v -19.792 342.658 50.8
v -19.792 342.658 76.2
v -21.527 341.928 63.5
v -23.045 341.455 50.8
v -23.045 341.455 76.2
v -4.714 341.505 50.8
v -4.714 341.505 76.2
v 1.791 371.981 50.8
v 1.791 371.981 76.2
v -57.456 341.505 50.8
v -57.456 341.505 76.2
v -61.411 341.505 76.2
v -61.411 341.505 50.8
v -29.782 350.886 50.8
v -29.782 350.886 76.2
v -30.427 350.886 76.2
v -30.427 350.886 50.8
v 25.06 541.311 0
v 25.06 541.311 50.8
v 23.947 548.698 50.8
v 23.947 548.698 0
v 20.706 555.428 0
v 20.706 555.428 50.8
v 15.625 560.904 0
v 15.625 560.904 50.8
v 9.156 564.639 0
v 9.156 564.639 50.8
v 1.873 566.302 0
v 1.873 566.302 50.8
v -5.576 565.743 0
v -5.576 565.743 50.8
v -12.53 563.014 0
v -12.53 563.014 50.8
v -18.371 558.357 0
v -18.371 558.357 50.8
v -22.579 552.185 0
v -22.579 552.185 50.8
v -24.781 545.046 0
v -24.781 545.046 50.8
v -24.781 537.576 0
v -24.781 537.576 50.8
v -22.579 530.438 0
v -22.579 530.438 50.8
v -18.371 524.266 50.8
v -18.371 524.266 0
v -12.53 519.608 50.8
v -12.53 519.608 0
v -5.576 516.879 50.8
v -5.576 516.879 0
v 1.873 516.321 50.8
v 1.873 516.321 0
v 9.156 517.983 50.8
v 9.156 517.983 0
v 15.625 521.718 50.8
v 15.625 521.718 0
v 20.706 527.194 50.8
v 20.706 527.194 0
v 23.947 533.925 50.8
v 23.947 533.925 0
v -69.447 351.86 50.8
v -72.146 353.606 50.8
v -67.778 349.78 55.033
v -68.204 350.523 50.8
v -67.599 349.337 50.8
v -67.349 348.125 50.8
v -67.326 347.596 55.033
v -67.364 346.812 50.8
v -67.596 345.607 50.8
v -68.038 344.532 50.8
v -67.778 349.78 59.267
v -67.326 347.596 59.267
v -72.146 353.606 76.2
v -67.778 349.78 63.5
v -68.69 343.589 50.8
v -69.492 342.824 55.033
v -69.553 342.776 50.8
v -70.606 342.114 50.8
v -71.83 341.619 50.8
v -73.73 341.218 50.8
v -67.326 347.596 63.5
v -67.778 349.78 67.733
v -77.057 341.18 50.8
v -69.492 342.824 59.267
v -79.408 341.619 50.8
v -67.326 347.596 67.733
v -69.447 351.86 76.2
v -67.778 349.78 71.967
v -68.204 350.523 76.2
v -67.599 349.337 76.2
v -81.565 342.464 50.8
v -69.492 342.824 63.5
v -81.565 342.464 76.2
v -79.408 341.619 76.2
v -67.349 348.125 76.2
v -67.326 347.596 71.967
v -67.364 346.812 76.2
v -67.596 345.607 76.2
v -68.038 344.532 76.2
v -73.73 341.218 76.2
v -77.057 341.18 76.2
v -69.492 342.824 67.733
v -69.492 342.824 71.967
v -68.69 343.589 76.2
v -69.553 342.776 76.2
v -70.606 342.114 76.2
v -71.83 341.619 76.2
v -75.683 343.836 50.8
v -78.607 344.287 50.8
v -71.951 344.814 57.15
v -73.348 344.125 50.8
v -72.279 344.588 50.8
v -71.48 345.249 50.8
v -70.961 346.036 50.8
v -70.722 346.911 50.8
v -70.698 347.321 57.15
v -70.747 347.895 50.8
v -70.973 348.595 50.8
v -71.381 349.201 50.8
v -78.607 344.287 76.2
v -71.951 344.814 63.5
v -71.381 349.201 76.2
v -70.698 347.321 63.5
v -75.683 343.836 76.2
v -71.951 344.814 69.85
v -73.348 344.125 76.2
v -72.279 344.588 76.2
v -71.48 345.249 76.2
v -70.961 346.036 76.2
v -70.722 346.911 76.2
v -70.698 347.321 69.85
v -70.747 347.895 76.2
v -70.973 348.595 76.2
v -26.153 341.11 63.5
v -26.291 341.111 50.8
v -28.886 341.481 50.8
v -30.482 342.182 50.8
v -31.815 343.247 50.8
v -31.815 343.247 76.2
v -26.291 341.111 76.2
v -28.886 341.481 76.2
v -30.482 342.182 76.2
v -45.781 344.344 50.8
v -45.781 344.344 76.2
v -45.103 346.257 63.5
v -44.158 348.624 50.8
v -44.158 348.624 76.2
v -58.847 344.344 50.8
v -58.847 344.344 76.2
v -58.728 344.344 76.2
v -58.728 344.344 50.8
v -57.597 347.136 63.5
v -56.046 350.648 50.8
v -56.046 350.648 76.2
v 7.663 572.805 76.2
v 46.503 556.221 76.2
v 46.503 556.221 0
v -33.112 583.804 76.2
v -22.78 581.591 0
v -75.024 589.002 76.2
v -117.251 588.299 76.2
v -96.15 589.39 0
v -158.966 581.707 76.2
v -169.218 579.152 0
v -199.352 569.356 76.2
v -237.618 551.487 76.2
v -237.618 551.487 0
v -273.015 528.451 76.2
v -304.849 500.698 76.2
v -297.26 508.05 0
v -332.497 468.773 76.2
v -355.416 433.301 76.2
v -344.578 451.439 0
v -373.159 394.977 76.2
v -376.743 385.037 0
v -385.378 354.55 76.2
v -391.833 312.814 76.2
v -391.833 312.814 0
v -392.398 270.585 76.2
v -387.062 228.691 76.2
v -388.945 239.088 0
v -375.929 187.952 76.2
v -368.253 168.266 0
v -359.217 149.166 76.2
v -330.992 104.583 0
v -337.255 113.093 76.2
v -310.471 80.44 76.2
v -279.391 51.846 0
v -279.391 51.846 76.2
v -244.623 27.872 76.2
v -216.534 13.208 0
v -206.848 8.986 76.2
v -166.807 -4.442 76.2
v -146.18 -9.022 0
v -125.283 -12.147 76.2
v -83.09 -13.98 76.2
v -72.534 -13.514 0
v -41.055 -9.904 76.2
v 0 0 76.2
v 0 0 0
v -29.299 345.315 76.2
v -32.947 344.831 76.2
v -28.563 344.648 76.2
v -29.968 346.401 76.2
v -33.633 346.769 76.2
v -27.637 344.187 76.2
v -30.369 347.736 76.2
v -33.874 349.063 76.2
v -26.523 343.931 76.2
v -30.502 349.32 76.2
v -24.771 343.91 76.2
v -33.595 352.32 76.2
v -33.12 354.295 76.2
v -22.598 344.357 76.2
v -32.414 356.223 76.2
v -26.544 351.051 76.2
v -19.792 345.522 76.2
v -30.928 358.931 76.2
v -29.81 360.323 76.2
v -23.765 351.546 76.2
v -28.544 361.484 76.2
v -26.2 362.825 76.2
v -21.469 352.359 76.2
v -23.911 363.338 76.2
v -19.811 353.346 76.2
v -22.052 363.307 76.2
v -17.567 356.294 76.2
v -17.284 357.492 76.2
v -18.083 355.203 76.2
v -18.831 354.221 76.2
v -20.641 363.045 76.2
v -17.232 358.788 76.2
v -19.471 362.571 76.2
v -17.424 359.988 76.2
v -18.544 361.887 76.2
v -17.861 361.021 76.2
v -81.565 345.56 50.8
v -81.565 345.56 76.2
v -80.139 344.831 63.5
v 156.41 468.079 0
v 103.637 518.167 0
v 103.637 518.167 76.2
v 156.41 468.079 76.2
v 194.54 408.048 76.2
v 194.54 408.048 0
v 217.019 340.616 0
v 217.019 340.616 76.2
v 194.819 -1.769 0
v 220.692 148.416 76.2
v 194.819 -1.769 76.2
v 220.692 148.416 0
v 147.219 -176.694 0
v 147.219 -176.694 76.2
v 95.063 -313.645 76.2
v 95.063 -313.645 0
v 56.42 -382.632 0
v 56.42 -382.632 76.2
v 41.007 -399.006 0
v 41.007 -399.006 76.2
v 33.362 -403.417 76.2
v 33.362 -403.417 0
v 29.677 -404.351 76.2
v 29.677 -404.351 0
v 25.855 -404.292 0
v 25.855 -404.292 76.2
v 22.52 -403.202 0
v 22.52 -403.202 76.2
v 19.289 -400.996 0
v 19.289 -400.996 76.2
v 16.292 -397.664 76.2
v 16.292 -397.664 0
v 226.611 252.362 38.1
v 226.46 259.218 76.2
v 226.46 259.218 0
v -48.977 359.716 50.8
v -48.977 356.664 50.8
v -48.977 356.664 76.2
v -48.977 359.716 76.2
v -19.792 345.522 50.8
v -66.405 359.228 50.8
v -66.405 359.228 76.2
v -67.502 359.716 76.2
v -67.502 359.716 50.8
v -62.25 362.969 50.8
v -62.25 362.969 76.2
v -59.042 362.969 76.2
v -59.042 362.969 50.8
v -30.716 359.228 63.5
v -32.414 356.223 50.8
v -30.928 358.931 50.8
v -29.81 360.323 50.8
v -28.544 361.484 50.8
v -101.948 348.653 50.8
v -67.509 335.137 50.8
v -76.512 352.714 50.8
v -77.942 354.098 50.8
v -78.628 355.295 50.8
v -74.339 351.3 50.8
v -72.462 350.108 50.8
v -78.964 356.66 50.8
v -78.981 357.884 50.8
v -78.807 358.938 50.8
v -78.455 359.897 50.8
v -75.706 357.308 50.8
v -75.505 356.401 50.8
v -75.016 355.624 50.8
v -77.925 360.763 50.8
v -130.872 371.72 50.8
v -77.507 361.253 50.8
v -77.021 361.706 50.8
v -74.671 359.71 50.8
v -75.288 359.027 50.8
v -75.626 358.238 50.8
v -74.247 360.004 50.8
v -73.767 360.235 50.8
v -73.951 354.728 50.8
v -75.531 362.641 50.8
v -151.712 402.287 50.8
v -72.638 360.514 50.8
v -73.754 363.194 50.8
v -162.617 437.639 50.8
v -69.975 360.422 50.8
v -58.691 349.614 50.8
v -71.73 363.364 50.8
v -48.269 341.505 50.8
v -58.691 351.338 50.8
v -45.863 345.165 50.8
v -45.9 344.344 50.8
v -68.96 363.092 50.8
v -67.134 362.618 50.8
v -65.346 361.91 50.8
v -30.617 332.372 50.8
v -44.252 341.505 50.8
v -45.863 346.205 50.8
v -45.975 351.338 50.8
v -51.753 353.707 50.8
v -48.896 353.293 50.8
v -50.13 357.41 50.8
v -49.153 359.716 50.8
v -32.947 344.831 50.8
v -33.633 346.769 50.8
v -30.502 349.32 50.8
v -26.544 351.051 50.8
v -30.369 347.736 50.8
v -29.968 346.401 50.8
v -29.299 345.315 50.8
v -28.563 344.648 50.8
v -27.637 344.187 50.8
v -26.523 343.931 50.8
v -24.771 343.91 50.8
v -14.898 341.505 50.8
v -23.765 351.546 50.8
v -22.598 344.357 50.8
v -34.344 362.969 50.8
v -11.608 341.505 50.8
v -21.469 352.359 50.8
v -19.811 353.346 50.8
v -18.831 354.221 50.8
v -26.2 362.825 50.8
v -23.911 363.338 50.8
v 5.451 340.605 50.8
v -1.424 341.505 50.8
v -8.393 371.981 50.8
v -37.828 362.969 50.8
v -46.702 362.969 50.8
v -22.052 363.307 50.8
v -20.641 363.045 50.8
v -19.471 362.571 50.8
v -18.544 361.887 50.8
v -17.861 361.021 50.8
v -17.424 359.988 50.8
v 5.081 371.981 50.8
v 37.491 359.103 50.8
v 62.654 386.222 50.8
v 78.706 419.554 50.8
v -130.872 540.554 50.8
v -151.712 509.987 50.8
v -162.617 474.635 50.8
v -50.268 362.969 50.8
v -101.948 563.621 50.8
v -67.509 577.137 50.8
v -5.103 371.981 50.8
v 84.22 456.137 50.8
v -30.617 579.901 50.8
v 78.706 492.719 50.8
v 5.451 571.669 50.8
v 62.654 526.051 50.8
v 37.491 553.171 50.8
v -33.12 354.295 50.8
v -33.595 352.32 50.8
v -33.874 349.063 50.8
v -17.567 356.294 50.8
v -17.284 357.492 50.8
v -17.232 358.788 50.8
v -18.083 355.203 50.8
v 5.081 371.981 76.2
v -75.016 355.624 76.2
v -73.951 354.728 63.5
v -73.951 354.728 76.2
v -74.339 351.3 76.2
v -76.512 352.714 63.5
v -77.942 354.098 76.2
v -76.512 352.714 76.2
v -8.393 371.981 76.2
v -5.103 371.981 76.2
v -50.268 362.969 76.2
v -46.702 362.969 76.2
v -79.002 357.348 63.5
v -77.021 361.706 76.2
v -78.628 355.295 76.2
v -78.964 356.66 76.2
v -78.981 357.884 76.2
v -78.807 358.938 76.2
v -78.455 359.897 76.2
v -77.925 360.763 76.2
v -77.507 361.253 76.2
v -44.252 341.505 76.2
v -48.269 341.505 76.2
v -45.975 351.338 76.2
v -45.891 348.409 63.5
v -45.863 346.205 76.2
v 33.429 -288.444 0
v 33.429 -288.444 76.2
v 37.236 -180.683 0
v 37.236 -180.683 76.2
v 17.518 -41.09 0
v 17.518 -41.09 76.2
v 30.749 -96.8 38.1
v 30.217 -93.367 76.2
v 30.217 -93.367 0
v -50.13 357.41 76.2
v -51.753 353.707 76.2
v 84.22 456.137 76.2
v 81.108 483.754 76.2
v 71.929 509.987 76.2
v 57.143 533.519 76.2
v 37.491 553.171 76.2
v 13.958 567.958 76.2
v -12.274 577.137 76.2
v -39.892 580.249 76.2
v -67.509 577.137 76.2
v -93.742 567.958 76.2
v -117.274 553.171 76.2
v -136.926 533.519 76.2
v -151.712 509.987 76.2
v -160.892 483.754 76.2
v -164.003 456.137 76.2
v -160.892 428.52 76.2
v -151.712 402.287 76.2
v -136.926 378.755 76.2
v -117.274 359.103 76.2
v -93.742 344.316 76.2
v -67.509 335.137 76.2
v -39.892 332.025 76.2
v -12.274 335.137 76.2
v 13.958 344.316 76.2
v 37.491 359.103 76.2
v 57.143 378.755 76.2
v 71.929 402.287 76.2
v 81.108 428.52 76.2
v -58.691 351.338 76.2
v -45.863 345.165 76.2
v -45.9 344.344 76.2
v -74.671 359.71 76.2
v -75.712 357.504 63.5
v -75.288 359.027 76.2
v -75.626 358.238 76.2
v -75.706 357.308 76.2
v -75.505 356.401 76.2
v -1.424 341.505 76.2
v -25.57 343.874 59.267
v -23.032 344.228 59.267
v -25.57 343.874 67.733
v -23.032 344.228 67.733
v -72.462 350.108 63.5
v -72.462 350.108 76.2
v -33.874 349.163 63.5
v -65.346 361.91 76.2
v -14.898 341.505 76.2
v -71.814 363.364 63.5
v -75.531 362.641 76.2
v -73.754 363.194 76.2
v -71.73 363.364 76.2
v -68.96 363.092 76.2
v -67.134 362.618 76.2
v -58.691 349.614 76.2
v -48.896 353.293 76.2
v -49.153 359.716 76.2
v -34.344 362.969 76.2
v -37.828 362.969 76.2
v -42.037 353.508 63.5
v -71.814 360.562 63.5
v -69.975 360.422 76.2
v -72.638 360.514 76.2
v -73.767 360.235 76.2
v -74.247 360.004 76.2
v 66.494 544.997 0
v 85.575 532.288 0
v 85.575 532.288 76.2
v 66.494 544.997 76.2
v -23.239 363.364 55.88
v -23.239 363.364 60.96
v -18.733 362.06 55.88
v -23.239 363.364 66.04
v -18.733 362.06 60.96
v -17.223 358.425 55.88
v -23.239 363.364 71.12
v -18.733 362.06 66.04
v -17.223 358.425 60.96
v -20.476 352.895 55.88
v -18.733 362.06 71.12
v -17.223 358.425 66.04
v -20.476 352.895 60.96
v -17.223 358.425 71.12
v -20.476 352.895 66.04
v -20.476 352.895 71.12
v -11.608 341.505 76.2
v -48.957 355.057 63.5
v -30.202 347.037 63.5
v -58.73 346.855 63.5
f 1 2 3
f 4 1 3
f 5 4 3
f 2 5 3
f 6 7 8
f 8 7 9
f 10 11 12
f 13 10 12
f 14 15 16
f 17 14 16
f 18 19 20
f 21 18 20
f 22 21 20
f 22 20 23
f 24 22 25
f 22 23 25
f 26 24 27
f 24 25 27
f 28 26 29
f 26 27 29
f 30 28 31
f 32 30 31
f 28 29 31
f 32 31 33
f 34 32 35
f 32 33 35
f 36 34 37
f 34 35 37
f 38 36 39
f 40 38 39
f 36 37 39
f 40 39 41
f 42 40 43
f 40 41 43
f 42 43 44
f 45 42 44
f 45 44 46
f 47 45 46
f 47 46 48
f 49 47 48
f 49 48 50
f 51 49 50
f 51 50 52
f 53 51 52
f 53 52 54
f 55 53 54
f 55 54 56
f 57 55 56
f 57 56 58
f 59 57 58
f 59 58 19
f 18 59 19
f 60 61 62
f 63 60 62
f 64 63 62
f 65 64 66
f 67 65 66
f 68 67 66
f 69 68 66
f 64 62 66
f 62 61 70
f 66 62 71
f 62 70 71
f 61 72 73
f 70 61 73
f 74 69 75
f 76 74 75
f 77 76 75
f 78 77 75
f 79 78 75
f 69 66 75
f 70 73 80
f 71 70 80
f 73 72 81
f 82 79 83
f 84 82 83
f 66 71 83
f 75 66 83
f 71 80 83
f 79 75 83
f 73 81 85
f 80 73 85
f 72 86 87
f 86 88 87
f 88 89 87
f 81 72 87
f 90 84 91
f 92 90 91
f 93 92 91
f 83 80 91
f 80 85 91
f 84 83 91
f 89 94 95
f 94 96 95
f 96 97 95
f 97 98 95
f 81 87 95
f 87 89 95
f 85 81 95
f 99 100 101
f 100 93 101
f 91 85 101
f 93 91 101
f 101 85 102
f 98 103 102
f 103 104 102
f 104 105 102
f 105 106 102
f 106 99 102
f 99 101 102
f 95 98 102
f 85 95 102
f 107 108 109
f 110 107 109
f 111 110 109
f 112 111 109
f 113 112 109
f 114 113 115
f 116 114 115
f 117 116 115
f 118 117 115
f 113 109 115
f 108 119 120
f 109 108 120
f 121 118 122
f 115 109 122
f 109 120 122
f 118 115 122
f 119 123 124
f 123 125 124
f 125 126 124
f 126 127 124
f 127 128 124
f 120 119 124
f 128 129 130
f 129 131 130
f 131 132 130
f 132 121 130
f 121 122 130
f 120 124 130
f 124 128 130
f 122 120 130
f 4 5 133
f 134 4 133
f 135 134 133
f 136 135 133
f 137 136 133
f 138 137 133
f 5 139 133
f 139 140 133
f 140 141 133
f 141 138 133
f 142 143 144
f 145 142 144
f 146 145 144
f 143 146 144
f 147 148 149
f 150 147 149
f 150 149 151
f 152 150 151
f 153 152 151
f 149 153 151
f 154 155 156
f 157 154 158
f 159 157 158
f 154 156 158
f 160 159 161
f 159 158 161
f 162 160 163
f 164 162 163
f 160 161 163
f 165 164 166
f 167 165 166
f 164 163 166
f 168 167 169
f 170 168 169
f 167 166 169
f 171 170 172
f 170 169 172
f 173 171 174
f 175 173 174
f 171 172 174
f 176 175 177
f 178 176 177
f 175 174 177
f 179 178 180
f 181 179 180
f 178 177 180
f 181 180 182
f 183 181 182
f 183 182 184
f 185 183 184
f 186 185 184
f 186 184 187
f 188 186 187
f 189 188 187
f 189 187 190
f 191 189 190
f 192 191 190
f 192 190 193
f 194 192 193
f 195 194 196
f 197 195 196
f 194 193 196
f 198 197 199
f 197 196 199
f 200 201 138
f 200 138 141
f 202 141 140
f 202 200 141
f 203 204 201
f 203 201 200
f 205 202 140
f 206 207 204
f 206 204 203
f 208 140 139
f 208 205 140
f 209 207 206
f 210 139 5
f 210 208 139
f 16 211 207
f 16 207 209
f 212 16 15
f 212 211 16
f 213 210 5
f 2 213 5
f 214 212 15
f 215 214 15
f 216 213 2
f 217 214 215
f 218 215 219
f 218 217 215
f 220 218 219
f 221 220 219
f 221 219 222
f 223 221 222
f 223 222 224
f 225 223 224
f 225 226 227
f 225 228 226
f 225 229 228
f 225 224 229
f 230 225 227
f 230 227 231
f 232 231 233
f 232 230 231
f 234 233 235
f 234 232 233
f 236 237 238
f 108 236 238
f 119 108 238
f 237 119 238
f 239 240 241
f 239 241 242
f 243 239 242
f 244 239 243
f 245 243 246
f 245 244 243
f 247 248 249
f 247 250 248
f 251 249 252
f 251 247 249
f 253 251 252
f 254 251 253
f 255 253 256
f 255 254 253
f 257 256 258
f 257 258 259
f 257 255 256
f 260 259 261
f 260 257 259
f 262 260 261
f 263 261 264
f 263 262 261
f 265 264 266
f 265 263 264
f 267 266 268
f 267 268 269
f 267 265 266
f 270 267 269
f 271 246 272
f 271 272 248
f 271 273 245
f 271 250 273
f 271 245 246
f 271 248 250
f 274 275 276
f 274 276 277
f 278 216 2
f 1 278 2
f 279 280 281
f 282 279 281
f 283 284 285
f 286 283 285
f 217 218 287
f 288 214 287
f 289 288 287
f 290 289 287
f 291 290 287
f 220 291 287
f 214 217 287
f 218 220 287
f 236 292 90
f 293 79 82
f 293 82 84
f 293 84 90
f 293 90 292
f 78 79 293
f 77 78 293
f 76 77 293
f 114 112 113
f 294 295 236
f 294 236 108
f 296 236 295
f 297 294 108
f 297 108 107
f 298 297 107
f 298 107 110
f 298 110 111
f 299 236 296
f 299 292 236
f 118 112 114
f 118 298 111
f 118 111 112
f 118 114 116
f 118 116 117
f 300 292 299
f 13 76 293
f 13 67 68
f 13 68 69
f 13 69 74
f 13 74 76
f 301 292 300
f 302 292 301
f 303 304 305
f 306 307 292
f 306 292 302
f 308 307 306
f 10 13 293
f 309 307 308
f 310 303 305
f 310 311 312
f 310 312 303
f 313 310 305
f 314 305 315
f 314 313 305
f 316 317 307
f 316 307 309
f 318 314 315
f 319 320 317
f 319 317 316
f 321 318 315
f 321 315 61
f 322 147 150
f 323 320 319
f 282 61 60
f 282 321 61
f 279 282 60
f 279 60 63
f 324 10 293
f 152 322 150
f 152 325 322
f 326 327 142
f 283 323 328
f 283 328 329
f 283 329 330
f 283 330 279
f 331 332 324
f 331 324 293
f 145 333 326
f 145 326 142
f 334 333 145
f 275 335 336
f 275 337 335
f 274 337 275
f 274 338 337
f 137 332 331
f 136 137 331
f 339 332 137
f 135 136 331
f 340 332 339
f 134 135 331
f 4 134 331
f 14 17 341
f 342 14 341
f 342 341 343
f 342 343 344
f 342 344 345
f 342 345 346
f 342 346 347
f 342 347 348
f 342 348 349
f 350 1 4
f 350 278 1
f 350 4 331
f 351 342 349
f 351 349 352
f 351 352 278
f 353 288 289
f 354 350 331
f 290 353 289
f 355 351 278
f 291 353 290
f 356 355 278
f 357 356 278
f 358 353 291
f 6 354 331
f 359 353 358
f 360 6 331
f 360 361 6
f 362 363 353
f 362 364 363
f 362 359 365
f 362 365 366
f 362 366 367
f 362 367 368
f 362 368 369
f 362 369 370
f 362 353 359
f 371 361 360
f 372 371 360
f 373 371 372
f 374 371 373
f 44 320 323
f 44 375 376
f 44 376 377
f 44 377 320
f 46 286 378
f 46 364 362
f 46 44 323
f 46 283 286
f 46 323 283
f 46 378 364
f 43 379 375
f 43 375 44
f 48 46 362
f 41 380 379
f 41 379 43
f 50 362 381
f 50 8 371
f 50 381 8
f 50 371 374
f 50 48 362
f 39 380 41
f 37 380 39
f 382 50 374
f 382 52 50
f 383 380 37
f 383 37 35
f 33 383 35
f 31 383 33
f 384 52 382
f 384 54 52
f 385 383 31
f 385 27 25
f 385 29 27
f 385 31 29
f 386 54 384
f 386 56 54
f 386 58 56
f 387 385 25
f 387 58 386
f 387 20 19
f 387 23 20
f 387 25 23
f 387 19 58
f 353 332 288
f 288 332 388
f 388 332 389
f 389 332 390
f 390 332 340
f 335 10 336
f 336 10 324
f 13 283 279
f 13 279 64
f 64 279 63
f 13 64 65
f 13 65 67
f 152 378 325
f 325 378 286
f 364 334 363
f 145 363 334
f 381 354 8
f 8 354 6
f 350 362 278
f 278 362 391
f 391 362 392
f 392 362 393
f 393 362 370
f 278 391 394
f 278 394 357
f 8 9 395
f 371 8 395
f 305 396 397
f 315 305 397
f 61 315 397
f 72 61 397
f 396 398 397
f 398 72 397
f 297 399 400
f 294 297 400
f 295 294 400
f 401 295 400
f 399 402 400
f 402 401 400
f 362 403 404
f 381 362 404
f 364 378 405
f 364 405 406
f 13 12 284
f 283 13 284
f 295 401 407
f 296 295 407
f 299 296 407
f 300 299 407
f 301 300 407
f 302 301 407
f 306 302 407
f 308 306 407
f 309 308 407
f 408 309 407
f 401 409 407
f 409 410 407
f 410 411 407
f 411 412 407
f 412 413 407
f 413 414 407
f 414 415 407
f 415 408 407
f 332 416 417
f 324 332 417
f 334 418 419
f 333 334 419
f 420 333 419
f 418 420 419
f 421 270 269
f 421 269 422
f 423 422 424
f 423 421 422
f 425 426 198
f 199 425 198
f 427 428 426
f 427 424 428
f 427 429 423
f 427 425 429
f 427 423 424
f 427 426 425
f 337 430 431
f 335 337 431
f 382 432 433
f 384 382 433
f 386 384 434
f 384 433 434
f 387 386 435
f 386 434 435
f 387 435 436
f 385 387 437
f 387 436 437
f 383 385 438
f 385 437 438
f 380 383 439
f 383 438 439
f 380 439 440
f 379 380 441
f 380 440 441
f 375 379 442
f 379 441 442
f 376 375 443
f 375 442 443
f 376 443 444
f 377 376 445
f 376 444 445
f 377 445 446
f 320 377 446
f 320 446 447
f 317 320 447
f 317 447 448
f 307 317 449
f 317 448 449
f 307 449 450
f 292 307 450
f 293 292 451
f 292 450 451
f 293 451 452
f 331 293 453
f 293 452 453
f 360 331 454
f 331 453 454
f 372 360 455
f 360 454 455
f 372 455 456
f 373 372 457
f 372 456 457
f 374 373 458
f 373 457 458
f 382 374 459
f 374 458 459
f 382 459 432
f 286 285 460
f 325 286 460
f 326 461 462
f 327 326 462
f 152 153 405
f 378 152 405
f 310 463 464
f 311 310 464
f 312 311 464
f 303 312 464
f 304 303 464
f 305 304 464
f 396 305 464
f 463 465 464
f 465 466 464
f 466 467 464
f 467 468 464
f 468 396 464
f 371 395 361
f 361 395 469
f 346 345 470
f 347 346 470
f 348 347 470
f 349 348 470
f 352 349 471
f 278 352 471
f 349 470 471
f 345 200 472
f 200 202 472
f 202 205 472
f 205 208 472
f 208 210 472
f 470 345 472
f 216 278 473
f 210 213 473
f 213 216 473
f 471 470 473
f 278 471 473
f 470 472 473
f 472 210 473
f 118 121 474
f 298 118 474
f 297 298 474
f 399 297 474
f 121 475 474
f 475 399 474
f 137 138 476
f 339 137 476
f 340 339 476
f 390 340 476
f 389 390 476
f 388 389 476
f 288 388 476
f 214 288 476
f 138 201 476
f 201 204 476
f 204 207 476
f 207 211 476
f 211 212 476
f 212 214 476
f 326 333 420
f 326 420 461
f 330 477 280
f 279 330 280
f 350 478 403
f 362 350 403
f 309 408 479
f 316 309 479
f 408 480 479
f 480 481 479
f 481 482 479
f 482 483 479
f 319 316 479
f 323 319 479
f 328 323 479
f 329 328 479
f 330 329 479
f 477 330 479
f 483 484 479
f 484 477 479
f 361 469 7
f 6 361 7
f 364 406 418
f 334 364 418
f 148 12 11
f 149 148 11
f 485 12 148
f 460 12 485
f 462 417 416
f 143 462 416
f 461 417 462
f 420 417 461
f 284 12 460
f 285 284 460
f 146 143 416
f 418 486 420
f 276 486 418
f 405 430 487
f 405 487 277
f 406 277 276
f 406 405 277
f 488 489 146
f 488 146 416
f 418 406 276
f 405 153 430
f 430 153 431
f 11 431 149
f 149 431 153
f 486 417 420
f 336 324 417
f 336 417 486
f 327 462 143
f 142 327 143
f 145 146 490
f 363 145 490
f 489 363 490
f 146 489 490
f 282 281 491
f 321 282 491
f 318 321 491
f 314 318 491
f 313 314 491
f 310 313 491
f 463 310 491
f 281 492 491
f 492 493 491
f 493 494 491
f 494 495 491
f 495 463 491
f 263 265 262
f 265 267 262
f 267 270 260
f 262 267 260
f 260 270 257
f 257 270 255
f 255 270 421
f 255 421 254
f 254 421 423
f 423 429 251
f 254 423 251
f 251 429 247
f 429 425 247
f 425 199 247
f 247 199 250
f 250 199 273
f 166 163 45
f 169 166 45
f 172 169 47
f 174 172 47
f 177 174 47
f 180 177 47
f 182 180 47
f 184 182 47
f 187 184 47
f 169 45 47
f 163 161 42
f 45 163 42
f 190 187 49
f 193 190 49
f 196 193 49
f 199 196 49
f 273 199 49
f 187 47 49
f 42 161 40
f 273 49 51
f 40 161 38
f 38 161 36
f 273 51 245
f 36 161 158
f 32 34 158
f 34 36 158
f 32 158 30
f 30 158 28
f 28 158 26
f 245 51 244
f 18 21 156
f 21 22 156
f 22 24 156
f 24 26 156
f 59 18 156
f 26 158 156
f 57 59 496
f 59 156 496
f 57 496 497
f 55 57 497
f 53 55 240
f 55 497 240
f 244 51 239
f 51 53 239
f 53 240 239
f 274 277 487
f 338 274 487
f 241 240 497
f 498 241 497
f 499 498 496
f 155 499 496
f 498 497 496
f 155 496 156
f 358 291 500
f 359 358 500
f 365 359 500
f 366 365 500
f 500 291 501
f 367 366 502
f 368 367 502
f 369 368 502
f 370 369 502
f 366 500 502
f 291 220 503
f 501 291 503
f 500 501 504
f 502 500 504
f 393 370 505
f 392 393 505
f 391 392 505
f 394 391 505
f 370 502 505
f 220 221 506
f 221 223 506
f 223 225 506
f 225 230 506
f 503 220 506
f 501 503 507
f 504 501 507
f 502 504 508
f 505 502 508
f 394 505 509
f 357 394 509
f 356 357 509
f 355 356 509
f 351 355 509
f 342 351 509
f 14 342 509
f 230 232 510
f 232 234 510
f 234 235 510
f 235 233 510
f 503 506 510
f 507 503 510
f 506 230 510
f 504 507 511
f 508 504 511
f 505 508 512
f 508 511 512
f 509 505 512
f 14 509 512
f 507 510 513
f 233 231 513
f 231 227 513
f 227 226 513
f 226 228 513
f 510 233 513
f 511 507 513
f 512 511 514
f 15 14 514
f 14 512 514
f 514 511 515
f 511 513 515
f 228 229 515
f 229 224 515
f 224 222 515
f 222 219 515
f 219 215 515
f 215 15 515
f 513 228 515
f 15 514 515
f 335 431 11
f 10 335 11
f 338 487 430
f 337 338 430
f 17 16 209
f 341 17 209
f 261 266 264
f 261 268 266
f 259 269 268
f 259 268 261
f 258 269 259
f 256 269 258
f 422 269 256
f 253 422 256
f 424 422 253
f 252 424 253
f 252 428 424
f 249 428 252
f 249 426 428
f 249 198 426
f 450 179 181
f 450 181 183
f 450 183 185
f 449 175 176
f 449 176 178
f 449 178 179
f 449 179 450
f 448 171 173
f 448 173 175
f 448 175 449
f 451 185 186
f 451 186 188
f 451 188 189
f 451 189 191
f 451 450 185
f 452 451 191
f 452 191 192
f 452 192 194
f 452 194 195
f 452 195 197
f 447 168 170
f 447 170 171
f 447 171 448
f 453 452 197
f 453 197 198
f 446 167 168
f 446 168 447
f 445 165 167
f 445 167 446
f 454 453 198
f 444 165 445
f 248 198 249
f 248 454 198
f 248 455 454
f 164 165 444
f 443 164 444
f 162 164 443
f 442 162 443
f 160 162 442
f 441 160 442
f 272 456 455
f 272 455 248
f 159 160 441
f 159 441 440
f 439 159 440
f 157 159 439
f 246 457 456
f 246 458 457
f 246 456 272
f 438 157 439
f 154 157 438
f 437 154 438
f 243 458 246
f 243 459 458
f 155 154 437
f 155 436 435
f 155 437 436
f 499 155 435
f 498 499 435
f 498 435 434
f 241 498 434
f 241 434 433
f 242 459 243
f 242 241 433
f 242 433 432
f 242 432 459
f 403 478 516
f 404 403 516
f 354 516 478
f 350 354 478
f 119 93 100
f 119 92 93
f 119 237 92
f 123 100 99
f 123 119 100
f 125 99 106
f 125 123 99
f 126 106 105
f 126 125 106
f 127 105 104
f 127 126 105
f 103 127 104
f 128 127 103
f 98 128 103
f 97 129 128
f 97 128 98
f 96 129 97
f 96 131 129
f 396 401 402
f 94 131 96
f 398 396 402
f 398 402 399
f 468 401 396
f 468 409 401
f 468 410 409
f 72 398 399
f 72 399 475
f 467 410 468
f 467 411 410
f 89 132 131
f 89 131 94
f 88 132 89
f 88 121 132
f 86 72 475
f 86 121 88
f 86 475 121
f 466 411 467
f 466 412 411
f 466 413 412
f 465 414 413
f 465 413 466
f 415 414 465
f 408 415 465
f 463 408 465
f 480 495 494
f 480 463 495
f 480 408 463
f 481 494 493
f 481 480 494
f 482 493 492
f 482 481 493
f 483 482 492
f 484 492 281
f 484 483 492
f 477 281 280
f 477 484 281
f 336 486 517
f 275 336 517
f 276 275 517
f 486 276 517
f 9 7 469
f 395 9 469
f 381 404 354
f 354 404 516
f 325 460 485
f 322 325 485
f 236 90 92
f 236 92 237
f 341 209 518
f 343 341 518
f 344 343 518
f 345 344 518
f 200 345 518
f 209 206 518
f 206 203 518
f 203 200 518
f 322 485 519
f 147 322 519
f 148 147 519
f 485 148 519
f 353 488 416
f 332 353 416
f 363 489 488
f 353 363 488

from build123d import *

# Parameters (mm, degrees)
F1_DEPTH = 76.2
F2_R     = 124.1115948674
F2_R_2   = 25.0604291134
F3_DEPTH = 25.4
F4_DEPTH = 76.2010001


with BuildPart() as f1:
    # F0 (on Top) → F1 (new body)
    with BuildSketch(Plane.XY):
        with BuildLine():
            add(Edge.make_bspline(
                [(46.503115952, 556.2205875025), (65.7668212961, 544.7412931299), (85.1253253591, 532.3849536565), (103.636674583, 518.1670188904)],
                knots=[0, 0, 0, 0, 0.0919372013, 0.0919372013, 0.0919372013, 0.0919372013], degree=3))
            ThreePointArc((103.636674583, 518.1670188904), (76.1555034208, 538.8237333012), (46.503115952, 556.2205875025))
        make_face()
        with BuildLine():
            add(Edge.make_bspline(
                [(103.636674583, 518.1670188904), (169.3449126156, 467.6987666499), (322.4804514396, 262.0016746149), (66.7895182617, -466.2360370375), (16.2921920384, -397.6638066205)],
                knots=[0.0919372013, 0.0919372013, 0.0919372013, 0.0919372013, 0.4182792434, 1, 1, 1, 1], degree=3))
            add(Edge.make_bspline(
                [(46.503115952, 556.2205875025), (65.7668212961, 544.7412931299), (85.1253253591, 532.3849536565), (103.636674583, 518.1670188904)],
                knots=[0, 0, 0, 0, 0.0919372013, 0.0919372013, 0.0919372013, 0.0919372013], degree=3))
            ThreePointArc((46.503115952, 556.2205875025), (-391.833140997, 312.8136692104), (0, 0))
            add(Edge.make_bspline(
                [(16.2921920384, -397.6638066205), (40.2802635686, -295.8483907348), (42.9598036421, -99.0477075274), (13.3533048422, -27.0724744672), (0, 0)],
                knots=[0, 0, 0, 0, 0.6326370031, 1, 1, 1, 1], degree=3))
        make_face()
    extrude(amount=F1_DEPTH)

    # F2 (on face) → F3 (cut)
    with BuildSketch(Plane.XY.offset(76.2)):
        with Locations((-39.8917477844, 456.1369303552)):
            Circle(F2_R)
        with BuildLine():
            add(Edge.make_bspline(
                [(-67.7776773232, 349.780344177), (-67.3264645743, 348.81211682), (-67.3264645743, 347.5963491355)],
                knots=[0, 0, 0, 1, 1, 1], degree=2))
            add(Edge.make_bspline(
                [(-67.3264645743, 347.5963491355), (-67.3264645743, 344.5381293931), (-69.4916590846, 342.8241476317)],
                knots=[0, 0, 0, 1, 1, 1], degree=2))
            add(Edge.make_bspline(
                [(-69.4916590846, 342.8241476317), (-71.6568535949, 341.1101658703), (-75.5924314602, 341.1101658703)],
                knots=[0, 0, 0, 1, 1, 1], degree=2))
            add(Edge.make_bspline(
                [(-75.5924314602, 341.1101658703), (-78.901324952, 341.1101658703), (-81.5647335392, 342.463804117)],
                knots=[0, 0, 0, 1, 1, 1], degree=2))
            Line((-81.5647335392, 342.463804117), (-81.5647335392, 345.5596249218))
            add(Edge.make_bspline(
                [(-81.5647335392, 345.5596249218), (-80.1922947613, 344.7386683926), (-78.6067832965, 344.2874556437)],
                knots=[0, 0, 0, 1, 1, 1], degree=2))
            add(Edge.make_bspline(
                [(-78.6067832965, 344.2874556437), (-77.0212718316, 343.8362428948), (-75.667633585, 343.8362428948)],
                knots=[0, 0, 0, 1, 1, 1], degree=2))
            add(Edge.make_bspline(
                [(-75.667633585, 343.8362428948), (-73.2047639973, 343.8362428948), (-71.9513952504, 344.8138705174)],
                knots=[0, 0, 0, 1, 1, 1], degree=2))
            add(Edge.make_bspline(
                [(-71.9513952504, 344.8138705174), (-70.6980265035, 345.79149814), (-70.6980265035, 347.3206080112)],
                knots=[0, 0, 0, 1, 1, 1], degree=2))
            add(Edge.make_bspline(
                [(-70.6980265035, 347.3206080112), (-70.6980265035, 348.436106196), (-71.3811124706, 349.2006611316)],
                knots=[0, 0, 0, 1, 1, 1], degree=2))
            add(Edge.make_bspline(
                [(-71.3811124706, 349.2006611316), (-72.0641984376, 349.9652160672), (-74.3390627133, 351.3000537826)],
                knots=[0, 0, 0, 1, 1, 1], degree=2))
            add(Edge.make_bspline(
                [(-74.3390627133, 351.3000537826), (-76.8834012695, 352.7288941541), (-77.9424978606, 354.0981995101)],
                knots=[0, 0, 0, 1, 1, 1], degree=2))
            add(Edge.make_bspline(
                [(-77.9424978606, 354.0981995101), (-79.0015944518, 355.4675048661), (-79.0015944518, 357.3475579864)],
                knots=[0, 0, 0, 1, 1, 1], degree=2))
            add(Edge.make_bspline(
                [(-79.0015944518, 357.3475579864), (-79.0015944518, 360.048567636), (-77.0212718316, 361.7061478038)],
                knots=[0, 0, 0, 1, 1, 1], degree=2))
            add(Edge.make_bspline(
                [(-77.0212718316, 361.7061478038), (-75.0409492115, 363.3637279716), (-71.8135246883, 363.3637279716)],
                knots=[0, 0, 0, 1, 1, 1], degree=2))
            add(Edge.make_bspline(
                [(-71.8135246883, 363.3637279716), (-68.4607632903, 363.3637279716), (-65.3461419542, 361.9098202252)],
                knots=[0, 0, 0, 1, 1, 1], degree=2))
            Line((-65.3461419542, 361.9098202252), (-66.4052385454, 359.2276111068))
            Line((-66.4052385454, 359.2276111068), (-67.5019361989, 359.7164249181))
            add(Edge.make_bspline(
                [(-67.5019361989, 359.7164249181), (-69.482258819, 360.5624488222), (-71.8135246883, 360.5624488222)],
                knots=[0, 0, 0, 1, 1, 1], degree=2))
            add(Edge.make_bspline(
                [(-71.8135246883, 360.5624488222), (-73.6309093713, 360.5624488222), (-74.6712054312, 359.7101580744)],
                knots=[0, 0, 0, 1, 1, 1], degree=2))
            add(Edge.make_bspline(
                [(-74.6712054312, 359.7101580744), (-75.7115014911, 358.8578673265), (-75.7115014911, 357.5042290798)],
                knots=[0, 0, 0, 1, 1, 1], degree=2))
            add(Edge.make_bspline(
                [(-75.7115014911, 357.5042290798), (-75.7115014911, 356.4075314263), (-75.0158818366, 355.6241759594)],
                knots=[0, 0, 0, 1, 1, 1], degree=2))
            add(Edge.make_bspline(
                [(-75.0158818366, 355.6241759594), (-74.3202621821, 354.8408204926), (-72.1456674062, 353.6062522769)],
                knots=[0, 0, 0, 1, 1, 1], degree=2))
            add(Edge.make_bspline(
                [(-72.1456674062, 353.6062522769), (-70.0462747551, 352.4343524986), (-69.1375824136, 351.5914620163)],
                knots=[0, 0, 0, 1, 1, 1], degree=2))
            add(Edge.make_bspline(
                [(-69.1375824136, 351.5914620163), (-68.2288900721, 350.748571534), (-67.7776773232, 349.780344177)],
                knots=[0, 0, 0, 1, 1, 1], degree=2))
        make_face(mode=Mode.SUBTRACT)
        with BuildLine():
            Line((-44.2519459439, 341.5049770256), (-48.2689927777, 341.5049770256))
            Line((-48.2689927777, 341.5049770256), (-48.8956771511, 353.2929100902))
            add(Edge.make_bspline(
                [(-48.8956771511, 353.2929100902), (-48.9771461197, 355.1353621482), (-48.9771461197, 356.6644720194)],
                knots=[0, 0, 0, 1, 1, 1], degree=2))
            Line((-48.9771461197, 356.6644720194), (-48.9771461197, 359.7164249181))
            Line((-48.9771461197, 359.7164249181), (-49.1526177443, 359.7164249181))
            Line((-49.1526177443, 359.7164249181), (-50.1302453668, 357.4102264238))
            Line((-50.1302453668, 357.4102264238), (-51.7533578941, 353.7065217767))
            Line((-51.7533578941, 353.7065217767), (-57.4561856925, 341.5049770256))
            Line((-57.4561856925, 341.5049770256), (-61.410564089, 341.5049770256))
            Line((-61.410564089, 341.5049770256), (-62.2503211494, 362.9689168163))
            Line((-62.2503211494, 362.9689168163), (-59.0416971573, 362.9689168163))
            Line((-59.0416971573, 362.9689168163), (-58.6907539082, 351.337654845))
            Line((-58.6907539082, 351.337654845), (-58.6907539082, 349.614272818))
            add(Edge.make_bspline(
                [(-58.6907539082, 349.614272818), (-58.6907539082, 346.7315247002), (-58.8474250015, 344.3438572373)],
                knots=[0, 0, 0, 1, 1, 1], degree=2))
            Line((-58.8474250015, 344.3438572373), (-58.7283549706, 344.3438572373))
            add(Edge.make_bspline(
                [(-58.7283549706, 344.3438572373), (-57.8071289416, 346.7753926063), (-56.0461458522, 350.6483020342)],
                knots=[0, 0, 0, 1, 1, 1], degree=2))
            Line((-56.0461458522, 350.6483020342), (-50.268115929, 362.9689168163))
            Line((-50.268115929, 362.9689168163), (-46.7022818441, 362.9689168163))
            Line((-46.7022818441, 362.9689168163), (-45.9753279709, 351.337654845))
            add(Edge.make_bspline(
                [(-45.9753279709, 351.337654845), (-45.8625247836, 348.0475618844), (-45.8625247836, 346.2051098265)],
                knots=[0, 0, 0, 1, 1, 1], degree=2))
            Line((-45.8625247836, 346.2051098265), (-45.8625247836, 345.1648137665))
            Line((-45.8625247836, 345.1648137665), (-45.900125846, 344.3438572373))
            Line((-45.900125846, 344.3438572373), (-45.7810558151, 344.3438572373))
            add(Edge.make_bspline(
                [(-45.7810558151, 344.3438572373), (-45.2358404102, 346.0296382019), (-44.1579432878, 348.624111508)],
                knots=[0, 0, 0, 1, 1, 1], degree=2))
            add(Edge.make_bspline(
                [(-44.1579432878, 348.624111508), (-43.0800461655, 351.2185848141), (-37.828431116, 362.9689168163)],
                knots=[0, 0, 0, 1, 1, 1], degree=2))
            Line((-37.828431116, 362.9689168163), (-34.3440659996, 362.9689168163))
            Line((-34.3440659996, 362.9689168163), (-44.2519459439, 341.5049770256))
        make_face(mode=Mode.SUBTRACT)
        with BuildLine():
            add(Edge.make_bspline(
                [(-23.0449467463, 341.4548422757), (-24.4549865865, 341.1101658703), (-26.1533012386, 341.1101658703)],
                knots=[0, 0, 0, 1, 1, 1], degree=2))
            add(Edge.make_bspline(
                [(-26.1533012386, 341.1101658703), (-29.7567363859, 341.1101658703), (-31.8153945527, 343.2471595838)],
                knots=[0, 0, 0, 1, 1, 1], degree=2))
            add(Edge.make_bspline(
                [(-31.8153945527, 343.2471595838), (-33.8740527195, 345.3841532972), (-33.8740527195, 349.1630600692)],
                knots=[0, 0, 0, 1, 1, 1], degree=2))
            add(Edge.make_bspline(
                [(-33.8740527195, 349.1630600692), (-33.8740527195, 352.8416973413), (-32.4138781294, 356.2226595361)],
                knots=[0, 0, 0, 1, 1, 1], degree=2))
            add(Edge.make_bspline(
                [(-32.4138781294, 356.2226595361), (-30.9537035392, 359.6036217309), (-28.5441021233, 361.4836748512)],
                knots=[0, 0, 0, 1, 1, 1], degree=2))
            add(Edge.make_bspline(
                [(-28.5441021233, 361.4836748512), (-26.1345007074, 363.3637279716), (-23.239218902, 363.3637279716)],
                knots=[0, 0, 0, 1, 1, 1], degree=2))
            add(Edge.make_bspline(
                [(-23.239218902, 363.3637279716), (-20.2436675969, 363.3637279716), (-18.7333582569, 362.0602244748)],
                knots=[0, 0, 0, 1, 1, 1], degree=2))
            add(Edge.make_bspline(
                [(-18.7333582569, 362.0602244748), (-17.2230489169, 360.756720978), (-17.2230489169, 358.4254551088)],
                knots=[0, 0, 0, 1, 1, 1], degree=2))
            add(Edge.make_bspline(
                [(-17.2230489169, 358.4254551088), (-17.2230489169, 354.90348893), (-20.4755408151, 352.8949655131)],
                knots=[0, 0, 0, 1, 1, 1], degree=2))
            add(Edge.make_bspline(
                [(-20.4755408151, 352.8949655131), (-23.7280327133, 350.8864420962), (-29.7818037609, 350.8864420962)],
                knots=[0, 0, 0, 1, 1, 1], degree=2))
            Line((-29.7818037609, 350.8864420962), (-30.4272886655, 350.8864420962))
            Line((-30.4272886655, 350.8864420962), (-30.5024907903, 349.3197311625))
            add(Edge.make_bspline(
                [(-30.5024907903, 349.3197311625), (-30.5024907903, 346.7565920751), (-29.2992567933, 345.3152180162)],
                knots=[0, 0, 0, 1, 1, 1], degree=2))
            add(Edge.make_bspline(
                [(-29.2992567933, 345.3152180162), (-28.0960227963, 343.8738439572), (-25.5704847713, 343.8738439572)],
                knots=[0, 0, 0, 1, 1, 1], degree=2))
            add(Edge.make_bspline(
                [(-25.5704847713, 343.8738439572), (-24.3359165556, 343.8738439572), (-23.0324130588, 344.2279206282)],
                knots=[0, 0, 0, 1, 1, 1], degree=2))
            add(Edge.make_bspline(
                [(-23.0324130588, 344.2279206282), (-21.728909562, 344.5819972992), (-19.792454848, 345.5220238594)],
                knots=[0, 0, 0, 1, 1, 1], degree=2))
            Line((-19.792454848, 345.5220238594), (-19.792454848, 342.6580762727))
            add(Edge.make_bspline(
                [(-19.792454848, 342.6580762727), (-21.634906906, 341.7995186811), (-23.0449467463, 341.4548422757)],
                knots=[0, 0, 0, 1, 1, 1], degree=2))
        make_face(mode=Mode.SUBTRACT)
        Polygon((-5.1029731343, 371.9806381065), (-11.6079569308, 341.5049770256), (-14.8980498914, 341.5049770256), (-8.393066095, 371.9806381065), align=None, mode=Mode.SUBTRACT)
        Polygon((5.0806479342, 371.9806381065), (-1.4243358622, 341.5049770256), (-4.7144288228, 341.5049770256), (1.7905549736, 371.9806381065), align=None, mode=Mode.SUBTRACT)
        with Locations((0, 541.3113636543)):
            Circle(F2_R_2, mode=Mode.SUBTRACT)
        with Locations((0, 541.3113636543)):
            Circle(F2_R_2)
    extrude(amount=-F3_DEPTH, mode=Mode.SUBTRACT)

    # F2 (on face) → F4 (cut, through all)
    with BuildSketch(Plane.XY.offset(76.2)):
        with Locations((0, 541.3113636543)):
            Circle(F2_R_2)
    extrude(amount=-F4_DEPTH, mode=Mode.SUBTRACT)


solid = f1.part
